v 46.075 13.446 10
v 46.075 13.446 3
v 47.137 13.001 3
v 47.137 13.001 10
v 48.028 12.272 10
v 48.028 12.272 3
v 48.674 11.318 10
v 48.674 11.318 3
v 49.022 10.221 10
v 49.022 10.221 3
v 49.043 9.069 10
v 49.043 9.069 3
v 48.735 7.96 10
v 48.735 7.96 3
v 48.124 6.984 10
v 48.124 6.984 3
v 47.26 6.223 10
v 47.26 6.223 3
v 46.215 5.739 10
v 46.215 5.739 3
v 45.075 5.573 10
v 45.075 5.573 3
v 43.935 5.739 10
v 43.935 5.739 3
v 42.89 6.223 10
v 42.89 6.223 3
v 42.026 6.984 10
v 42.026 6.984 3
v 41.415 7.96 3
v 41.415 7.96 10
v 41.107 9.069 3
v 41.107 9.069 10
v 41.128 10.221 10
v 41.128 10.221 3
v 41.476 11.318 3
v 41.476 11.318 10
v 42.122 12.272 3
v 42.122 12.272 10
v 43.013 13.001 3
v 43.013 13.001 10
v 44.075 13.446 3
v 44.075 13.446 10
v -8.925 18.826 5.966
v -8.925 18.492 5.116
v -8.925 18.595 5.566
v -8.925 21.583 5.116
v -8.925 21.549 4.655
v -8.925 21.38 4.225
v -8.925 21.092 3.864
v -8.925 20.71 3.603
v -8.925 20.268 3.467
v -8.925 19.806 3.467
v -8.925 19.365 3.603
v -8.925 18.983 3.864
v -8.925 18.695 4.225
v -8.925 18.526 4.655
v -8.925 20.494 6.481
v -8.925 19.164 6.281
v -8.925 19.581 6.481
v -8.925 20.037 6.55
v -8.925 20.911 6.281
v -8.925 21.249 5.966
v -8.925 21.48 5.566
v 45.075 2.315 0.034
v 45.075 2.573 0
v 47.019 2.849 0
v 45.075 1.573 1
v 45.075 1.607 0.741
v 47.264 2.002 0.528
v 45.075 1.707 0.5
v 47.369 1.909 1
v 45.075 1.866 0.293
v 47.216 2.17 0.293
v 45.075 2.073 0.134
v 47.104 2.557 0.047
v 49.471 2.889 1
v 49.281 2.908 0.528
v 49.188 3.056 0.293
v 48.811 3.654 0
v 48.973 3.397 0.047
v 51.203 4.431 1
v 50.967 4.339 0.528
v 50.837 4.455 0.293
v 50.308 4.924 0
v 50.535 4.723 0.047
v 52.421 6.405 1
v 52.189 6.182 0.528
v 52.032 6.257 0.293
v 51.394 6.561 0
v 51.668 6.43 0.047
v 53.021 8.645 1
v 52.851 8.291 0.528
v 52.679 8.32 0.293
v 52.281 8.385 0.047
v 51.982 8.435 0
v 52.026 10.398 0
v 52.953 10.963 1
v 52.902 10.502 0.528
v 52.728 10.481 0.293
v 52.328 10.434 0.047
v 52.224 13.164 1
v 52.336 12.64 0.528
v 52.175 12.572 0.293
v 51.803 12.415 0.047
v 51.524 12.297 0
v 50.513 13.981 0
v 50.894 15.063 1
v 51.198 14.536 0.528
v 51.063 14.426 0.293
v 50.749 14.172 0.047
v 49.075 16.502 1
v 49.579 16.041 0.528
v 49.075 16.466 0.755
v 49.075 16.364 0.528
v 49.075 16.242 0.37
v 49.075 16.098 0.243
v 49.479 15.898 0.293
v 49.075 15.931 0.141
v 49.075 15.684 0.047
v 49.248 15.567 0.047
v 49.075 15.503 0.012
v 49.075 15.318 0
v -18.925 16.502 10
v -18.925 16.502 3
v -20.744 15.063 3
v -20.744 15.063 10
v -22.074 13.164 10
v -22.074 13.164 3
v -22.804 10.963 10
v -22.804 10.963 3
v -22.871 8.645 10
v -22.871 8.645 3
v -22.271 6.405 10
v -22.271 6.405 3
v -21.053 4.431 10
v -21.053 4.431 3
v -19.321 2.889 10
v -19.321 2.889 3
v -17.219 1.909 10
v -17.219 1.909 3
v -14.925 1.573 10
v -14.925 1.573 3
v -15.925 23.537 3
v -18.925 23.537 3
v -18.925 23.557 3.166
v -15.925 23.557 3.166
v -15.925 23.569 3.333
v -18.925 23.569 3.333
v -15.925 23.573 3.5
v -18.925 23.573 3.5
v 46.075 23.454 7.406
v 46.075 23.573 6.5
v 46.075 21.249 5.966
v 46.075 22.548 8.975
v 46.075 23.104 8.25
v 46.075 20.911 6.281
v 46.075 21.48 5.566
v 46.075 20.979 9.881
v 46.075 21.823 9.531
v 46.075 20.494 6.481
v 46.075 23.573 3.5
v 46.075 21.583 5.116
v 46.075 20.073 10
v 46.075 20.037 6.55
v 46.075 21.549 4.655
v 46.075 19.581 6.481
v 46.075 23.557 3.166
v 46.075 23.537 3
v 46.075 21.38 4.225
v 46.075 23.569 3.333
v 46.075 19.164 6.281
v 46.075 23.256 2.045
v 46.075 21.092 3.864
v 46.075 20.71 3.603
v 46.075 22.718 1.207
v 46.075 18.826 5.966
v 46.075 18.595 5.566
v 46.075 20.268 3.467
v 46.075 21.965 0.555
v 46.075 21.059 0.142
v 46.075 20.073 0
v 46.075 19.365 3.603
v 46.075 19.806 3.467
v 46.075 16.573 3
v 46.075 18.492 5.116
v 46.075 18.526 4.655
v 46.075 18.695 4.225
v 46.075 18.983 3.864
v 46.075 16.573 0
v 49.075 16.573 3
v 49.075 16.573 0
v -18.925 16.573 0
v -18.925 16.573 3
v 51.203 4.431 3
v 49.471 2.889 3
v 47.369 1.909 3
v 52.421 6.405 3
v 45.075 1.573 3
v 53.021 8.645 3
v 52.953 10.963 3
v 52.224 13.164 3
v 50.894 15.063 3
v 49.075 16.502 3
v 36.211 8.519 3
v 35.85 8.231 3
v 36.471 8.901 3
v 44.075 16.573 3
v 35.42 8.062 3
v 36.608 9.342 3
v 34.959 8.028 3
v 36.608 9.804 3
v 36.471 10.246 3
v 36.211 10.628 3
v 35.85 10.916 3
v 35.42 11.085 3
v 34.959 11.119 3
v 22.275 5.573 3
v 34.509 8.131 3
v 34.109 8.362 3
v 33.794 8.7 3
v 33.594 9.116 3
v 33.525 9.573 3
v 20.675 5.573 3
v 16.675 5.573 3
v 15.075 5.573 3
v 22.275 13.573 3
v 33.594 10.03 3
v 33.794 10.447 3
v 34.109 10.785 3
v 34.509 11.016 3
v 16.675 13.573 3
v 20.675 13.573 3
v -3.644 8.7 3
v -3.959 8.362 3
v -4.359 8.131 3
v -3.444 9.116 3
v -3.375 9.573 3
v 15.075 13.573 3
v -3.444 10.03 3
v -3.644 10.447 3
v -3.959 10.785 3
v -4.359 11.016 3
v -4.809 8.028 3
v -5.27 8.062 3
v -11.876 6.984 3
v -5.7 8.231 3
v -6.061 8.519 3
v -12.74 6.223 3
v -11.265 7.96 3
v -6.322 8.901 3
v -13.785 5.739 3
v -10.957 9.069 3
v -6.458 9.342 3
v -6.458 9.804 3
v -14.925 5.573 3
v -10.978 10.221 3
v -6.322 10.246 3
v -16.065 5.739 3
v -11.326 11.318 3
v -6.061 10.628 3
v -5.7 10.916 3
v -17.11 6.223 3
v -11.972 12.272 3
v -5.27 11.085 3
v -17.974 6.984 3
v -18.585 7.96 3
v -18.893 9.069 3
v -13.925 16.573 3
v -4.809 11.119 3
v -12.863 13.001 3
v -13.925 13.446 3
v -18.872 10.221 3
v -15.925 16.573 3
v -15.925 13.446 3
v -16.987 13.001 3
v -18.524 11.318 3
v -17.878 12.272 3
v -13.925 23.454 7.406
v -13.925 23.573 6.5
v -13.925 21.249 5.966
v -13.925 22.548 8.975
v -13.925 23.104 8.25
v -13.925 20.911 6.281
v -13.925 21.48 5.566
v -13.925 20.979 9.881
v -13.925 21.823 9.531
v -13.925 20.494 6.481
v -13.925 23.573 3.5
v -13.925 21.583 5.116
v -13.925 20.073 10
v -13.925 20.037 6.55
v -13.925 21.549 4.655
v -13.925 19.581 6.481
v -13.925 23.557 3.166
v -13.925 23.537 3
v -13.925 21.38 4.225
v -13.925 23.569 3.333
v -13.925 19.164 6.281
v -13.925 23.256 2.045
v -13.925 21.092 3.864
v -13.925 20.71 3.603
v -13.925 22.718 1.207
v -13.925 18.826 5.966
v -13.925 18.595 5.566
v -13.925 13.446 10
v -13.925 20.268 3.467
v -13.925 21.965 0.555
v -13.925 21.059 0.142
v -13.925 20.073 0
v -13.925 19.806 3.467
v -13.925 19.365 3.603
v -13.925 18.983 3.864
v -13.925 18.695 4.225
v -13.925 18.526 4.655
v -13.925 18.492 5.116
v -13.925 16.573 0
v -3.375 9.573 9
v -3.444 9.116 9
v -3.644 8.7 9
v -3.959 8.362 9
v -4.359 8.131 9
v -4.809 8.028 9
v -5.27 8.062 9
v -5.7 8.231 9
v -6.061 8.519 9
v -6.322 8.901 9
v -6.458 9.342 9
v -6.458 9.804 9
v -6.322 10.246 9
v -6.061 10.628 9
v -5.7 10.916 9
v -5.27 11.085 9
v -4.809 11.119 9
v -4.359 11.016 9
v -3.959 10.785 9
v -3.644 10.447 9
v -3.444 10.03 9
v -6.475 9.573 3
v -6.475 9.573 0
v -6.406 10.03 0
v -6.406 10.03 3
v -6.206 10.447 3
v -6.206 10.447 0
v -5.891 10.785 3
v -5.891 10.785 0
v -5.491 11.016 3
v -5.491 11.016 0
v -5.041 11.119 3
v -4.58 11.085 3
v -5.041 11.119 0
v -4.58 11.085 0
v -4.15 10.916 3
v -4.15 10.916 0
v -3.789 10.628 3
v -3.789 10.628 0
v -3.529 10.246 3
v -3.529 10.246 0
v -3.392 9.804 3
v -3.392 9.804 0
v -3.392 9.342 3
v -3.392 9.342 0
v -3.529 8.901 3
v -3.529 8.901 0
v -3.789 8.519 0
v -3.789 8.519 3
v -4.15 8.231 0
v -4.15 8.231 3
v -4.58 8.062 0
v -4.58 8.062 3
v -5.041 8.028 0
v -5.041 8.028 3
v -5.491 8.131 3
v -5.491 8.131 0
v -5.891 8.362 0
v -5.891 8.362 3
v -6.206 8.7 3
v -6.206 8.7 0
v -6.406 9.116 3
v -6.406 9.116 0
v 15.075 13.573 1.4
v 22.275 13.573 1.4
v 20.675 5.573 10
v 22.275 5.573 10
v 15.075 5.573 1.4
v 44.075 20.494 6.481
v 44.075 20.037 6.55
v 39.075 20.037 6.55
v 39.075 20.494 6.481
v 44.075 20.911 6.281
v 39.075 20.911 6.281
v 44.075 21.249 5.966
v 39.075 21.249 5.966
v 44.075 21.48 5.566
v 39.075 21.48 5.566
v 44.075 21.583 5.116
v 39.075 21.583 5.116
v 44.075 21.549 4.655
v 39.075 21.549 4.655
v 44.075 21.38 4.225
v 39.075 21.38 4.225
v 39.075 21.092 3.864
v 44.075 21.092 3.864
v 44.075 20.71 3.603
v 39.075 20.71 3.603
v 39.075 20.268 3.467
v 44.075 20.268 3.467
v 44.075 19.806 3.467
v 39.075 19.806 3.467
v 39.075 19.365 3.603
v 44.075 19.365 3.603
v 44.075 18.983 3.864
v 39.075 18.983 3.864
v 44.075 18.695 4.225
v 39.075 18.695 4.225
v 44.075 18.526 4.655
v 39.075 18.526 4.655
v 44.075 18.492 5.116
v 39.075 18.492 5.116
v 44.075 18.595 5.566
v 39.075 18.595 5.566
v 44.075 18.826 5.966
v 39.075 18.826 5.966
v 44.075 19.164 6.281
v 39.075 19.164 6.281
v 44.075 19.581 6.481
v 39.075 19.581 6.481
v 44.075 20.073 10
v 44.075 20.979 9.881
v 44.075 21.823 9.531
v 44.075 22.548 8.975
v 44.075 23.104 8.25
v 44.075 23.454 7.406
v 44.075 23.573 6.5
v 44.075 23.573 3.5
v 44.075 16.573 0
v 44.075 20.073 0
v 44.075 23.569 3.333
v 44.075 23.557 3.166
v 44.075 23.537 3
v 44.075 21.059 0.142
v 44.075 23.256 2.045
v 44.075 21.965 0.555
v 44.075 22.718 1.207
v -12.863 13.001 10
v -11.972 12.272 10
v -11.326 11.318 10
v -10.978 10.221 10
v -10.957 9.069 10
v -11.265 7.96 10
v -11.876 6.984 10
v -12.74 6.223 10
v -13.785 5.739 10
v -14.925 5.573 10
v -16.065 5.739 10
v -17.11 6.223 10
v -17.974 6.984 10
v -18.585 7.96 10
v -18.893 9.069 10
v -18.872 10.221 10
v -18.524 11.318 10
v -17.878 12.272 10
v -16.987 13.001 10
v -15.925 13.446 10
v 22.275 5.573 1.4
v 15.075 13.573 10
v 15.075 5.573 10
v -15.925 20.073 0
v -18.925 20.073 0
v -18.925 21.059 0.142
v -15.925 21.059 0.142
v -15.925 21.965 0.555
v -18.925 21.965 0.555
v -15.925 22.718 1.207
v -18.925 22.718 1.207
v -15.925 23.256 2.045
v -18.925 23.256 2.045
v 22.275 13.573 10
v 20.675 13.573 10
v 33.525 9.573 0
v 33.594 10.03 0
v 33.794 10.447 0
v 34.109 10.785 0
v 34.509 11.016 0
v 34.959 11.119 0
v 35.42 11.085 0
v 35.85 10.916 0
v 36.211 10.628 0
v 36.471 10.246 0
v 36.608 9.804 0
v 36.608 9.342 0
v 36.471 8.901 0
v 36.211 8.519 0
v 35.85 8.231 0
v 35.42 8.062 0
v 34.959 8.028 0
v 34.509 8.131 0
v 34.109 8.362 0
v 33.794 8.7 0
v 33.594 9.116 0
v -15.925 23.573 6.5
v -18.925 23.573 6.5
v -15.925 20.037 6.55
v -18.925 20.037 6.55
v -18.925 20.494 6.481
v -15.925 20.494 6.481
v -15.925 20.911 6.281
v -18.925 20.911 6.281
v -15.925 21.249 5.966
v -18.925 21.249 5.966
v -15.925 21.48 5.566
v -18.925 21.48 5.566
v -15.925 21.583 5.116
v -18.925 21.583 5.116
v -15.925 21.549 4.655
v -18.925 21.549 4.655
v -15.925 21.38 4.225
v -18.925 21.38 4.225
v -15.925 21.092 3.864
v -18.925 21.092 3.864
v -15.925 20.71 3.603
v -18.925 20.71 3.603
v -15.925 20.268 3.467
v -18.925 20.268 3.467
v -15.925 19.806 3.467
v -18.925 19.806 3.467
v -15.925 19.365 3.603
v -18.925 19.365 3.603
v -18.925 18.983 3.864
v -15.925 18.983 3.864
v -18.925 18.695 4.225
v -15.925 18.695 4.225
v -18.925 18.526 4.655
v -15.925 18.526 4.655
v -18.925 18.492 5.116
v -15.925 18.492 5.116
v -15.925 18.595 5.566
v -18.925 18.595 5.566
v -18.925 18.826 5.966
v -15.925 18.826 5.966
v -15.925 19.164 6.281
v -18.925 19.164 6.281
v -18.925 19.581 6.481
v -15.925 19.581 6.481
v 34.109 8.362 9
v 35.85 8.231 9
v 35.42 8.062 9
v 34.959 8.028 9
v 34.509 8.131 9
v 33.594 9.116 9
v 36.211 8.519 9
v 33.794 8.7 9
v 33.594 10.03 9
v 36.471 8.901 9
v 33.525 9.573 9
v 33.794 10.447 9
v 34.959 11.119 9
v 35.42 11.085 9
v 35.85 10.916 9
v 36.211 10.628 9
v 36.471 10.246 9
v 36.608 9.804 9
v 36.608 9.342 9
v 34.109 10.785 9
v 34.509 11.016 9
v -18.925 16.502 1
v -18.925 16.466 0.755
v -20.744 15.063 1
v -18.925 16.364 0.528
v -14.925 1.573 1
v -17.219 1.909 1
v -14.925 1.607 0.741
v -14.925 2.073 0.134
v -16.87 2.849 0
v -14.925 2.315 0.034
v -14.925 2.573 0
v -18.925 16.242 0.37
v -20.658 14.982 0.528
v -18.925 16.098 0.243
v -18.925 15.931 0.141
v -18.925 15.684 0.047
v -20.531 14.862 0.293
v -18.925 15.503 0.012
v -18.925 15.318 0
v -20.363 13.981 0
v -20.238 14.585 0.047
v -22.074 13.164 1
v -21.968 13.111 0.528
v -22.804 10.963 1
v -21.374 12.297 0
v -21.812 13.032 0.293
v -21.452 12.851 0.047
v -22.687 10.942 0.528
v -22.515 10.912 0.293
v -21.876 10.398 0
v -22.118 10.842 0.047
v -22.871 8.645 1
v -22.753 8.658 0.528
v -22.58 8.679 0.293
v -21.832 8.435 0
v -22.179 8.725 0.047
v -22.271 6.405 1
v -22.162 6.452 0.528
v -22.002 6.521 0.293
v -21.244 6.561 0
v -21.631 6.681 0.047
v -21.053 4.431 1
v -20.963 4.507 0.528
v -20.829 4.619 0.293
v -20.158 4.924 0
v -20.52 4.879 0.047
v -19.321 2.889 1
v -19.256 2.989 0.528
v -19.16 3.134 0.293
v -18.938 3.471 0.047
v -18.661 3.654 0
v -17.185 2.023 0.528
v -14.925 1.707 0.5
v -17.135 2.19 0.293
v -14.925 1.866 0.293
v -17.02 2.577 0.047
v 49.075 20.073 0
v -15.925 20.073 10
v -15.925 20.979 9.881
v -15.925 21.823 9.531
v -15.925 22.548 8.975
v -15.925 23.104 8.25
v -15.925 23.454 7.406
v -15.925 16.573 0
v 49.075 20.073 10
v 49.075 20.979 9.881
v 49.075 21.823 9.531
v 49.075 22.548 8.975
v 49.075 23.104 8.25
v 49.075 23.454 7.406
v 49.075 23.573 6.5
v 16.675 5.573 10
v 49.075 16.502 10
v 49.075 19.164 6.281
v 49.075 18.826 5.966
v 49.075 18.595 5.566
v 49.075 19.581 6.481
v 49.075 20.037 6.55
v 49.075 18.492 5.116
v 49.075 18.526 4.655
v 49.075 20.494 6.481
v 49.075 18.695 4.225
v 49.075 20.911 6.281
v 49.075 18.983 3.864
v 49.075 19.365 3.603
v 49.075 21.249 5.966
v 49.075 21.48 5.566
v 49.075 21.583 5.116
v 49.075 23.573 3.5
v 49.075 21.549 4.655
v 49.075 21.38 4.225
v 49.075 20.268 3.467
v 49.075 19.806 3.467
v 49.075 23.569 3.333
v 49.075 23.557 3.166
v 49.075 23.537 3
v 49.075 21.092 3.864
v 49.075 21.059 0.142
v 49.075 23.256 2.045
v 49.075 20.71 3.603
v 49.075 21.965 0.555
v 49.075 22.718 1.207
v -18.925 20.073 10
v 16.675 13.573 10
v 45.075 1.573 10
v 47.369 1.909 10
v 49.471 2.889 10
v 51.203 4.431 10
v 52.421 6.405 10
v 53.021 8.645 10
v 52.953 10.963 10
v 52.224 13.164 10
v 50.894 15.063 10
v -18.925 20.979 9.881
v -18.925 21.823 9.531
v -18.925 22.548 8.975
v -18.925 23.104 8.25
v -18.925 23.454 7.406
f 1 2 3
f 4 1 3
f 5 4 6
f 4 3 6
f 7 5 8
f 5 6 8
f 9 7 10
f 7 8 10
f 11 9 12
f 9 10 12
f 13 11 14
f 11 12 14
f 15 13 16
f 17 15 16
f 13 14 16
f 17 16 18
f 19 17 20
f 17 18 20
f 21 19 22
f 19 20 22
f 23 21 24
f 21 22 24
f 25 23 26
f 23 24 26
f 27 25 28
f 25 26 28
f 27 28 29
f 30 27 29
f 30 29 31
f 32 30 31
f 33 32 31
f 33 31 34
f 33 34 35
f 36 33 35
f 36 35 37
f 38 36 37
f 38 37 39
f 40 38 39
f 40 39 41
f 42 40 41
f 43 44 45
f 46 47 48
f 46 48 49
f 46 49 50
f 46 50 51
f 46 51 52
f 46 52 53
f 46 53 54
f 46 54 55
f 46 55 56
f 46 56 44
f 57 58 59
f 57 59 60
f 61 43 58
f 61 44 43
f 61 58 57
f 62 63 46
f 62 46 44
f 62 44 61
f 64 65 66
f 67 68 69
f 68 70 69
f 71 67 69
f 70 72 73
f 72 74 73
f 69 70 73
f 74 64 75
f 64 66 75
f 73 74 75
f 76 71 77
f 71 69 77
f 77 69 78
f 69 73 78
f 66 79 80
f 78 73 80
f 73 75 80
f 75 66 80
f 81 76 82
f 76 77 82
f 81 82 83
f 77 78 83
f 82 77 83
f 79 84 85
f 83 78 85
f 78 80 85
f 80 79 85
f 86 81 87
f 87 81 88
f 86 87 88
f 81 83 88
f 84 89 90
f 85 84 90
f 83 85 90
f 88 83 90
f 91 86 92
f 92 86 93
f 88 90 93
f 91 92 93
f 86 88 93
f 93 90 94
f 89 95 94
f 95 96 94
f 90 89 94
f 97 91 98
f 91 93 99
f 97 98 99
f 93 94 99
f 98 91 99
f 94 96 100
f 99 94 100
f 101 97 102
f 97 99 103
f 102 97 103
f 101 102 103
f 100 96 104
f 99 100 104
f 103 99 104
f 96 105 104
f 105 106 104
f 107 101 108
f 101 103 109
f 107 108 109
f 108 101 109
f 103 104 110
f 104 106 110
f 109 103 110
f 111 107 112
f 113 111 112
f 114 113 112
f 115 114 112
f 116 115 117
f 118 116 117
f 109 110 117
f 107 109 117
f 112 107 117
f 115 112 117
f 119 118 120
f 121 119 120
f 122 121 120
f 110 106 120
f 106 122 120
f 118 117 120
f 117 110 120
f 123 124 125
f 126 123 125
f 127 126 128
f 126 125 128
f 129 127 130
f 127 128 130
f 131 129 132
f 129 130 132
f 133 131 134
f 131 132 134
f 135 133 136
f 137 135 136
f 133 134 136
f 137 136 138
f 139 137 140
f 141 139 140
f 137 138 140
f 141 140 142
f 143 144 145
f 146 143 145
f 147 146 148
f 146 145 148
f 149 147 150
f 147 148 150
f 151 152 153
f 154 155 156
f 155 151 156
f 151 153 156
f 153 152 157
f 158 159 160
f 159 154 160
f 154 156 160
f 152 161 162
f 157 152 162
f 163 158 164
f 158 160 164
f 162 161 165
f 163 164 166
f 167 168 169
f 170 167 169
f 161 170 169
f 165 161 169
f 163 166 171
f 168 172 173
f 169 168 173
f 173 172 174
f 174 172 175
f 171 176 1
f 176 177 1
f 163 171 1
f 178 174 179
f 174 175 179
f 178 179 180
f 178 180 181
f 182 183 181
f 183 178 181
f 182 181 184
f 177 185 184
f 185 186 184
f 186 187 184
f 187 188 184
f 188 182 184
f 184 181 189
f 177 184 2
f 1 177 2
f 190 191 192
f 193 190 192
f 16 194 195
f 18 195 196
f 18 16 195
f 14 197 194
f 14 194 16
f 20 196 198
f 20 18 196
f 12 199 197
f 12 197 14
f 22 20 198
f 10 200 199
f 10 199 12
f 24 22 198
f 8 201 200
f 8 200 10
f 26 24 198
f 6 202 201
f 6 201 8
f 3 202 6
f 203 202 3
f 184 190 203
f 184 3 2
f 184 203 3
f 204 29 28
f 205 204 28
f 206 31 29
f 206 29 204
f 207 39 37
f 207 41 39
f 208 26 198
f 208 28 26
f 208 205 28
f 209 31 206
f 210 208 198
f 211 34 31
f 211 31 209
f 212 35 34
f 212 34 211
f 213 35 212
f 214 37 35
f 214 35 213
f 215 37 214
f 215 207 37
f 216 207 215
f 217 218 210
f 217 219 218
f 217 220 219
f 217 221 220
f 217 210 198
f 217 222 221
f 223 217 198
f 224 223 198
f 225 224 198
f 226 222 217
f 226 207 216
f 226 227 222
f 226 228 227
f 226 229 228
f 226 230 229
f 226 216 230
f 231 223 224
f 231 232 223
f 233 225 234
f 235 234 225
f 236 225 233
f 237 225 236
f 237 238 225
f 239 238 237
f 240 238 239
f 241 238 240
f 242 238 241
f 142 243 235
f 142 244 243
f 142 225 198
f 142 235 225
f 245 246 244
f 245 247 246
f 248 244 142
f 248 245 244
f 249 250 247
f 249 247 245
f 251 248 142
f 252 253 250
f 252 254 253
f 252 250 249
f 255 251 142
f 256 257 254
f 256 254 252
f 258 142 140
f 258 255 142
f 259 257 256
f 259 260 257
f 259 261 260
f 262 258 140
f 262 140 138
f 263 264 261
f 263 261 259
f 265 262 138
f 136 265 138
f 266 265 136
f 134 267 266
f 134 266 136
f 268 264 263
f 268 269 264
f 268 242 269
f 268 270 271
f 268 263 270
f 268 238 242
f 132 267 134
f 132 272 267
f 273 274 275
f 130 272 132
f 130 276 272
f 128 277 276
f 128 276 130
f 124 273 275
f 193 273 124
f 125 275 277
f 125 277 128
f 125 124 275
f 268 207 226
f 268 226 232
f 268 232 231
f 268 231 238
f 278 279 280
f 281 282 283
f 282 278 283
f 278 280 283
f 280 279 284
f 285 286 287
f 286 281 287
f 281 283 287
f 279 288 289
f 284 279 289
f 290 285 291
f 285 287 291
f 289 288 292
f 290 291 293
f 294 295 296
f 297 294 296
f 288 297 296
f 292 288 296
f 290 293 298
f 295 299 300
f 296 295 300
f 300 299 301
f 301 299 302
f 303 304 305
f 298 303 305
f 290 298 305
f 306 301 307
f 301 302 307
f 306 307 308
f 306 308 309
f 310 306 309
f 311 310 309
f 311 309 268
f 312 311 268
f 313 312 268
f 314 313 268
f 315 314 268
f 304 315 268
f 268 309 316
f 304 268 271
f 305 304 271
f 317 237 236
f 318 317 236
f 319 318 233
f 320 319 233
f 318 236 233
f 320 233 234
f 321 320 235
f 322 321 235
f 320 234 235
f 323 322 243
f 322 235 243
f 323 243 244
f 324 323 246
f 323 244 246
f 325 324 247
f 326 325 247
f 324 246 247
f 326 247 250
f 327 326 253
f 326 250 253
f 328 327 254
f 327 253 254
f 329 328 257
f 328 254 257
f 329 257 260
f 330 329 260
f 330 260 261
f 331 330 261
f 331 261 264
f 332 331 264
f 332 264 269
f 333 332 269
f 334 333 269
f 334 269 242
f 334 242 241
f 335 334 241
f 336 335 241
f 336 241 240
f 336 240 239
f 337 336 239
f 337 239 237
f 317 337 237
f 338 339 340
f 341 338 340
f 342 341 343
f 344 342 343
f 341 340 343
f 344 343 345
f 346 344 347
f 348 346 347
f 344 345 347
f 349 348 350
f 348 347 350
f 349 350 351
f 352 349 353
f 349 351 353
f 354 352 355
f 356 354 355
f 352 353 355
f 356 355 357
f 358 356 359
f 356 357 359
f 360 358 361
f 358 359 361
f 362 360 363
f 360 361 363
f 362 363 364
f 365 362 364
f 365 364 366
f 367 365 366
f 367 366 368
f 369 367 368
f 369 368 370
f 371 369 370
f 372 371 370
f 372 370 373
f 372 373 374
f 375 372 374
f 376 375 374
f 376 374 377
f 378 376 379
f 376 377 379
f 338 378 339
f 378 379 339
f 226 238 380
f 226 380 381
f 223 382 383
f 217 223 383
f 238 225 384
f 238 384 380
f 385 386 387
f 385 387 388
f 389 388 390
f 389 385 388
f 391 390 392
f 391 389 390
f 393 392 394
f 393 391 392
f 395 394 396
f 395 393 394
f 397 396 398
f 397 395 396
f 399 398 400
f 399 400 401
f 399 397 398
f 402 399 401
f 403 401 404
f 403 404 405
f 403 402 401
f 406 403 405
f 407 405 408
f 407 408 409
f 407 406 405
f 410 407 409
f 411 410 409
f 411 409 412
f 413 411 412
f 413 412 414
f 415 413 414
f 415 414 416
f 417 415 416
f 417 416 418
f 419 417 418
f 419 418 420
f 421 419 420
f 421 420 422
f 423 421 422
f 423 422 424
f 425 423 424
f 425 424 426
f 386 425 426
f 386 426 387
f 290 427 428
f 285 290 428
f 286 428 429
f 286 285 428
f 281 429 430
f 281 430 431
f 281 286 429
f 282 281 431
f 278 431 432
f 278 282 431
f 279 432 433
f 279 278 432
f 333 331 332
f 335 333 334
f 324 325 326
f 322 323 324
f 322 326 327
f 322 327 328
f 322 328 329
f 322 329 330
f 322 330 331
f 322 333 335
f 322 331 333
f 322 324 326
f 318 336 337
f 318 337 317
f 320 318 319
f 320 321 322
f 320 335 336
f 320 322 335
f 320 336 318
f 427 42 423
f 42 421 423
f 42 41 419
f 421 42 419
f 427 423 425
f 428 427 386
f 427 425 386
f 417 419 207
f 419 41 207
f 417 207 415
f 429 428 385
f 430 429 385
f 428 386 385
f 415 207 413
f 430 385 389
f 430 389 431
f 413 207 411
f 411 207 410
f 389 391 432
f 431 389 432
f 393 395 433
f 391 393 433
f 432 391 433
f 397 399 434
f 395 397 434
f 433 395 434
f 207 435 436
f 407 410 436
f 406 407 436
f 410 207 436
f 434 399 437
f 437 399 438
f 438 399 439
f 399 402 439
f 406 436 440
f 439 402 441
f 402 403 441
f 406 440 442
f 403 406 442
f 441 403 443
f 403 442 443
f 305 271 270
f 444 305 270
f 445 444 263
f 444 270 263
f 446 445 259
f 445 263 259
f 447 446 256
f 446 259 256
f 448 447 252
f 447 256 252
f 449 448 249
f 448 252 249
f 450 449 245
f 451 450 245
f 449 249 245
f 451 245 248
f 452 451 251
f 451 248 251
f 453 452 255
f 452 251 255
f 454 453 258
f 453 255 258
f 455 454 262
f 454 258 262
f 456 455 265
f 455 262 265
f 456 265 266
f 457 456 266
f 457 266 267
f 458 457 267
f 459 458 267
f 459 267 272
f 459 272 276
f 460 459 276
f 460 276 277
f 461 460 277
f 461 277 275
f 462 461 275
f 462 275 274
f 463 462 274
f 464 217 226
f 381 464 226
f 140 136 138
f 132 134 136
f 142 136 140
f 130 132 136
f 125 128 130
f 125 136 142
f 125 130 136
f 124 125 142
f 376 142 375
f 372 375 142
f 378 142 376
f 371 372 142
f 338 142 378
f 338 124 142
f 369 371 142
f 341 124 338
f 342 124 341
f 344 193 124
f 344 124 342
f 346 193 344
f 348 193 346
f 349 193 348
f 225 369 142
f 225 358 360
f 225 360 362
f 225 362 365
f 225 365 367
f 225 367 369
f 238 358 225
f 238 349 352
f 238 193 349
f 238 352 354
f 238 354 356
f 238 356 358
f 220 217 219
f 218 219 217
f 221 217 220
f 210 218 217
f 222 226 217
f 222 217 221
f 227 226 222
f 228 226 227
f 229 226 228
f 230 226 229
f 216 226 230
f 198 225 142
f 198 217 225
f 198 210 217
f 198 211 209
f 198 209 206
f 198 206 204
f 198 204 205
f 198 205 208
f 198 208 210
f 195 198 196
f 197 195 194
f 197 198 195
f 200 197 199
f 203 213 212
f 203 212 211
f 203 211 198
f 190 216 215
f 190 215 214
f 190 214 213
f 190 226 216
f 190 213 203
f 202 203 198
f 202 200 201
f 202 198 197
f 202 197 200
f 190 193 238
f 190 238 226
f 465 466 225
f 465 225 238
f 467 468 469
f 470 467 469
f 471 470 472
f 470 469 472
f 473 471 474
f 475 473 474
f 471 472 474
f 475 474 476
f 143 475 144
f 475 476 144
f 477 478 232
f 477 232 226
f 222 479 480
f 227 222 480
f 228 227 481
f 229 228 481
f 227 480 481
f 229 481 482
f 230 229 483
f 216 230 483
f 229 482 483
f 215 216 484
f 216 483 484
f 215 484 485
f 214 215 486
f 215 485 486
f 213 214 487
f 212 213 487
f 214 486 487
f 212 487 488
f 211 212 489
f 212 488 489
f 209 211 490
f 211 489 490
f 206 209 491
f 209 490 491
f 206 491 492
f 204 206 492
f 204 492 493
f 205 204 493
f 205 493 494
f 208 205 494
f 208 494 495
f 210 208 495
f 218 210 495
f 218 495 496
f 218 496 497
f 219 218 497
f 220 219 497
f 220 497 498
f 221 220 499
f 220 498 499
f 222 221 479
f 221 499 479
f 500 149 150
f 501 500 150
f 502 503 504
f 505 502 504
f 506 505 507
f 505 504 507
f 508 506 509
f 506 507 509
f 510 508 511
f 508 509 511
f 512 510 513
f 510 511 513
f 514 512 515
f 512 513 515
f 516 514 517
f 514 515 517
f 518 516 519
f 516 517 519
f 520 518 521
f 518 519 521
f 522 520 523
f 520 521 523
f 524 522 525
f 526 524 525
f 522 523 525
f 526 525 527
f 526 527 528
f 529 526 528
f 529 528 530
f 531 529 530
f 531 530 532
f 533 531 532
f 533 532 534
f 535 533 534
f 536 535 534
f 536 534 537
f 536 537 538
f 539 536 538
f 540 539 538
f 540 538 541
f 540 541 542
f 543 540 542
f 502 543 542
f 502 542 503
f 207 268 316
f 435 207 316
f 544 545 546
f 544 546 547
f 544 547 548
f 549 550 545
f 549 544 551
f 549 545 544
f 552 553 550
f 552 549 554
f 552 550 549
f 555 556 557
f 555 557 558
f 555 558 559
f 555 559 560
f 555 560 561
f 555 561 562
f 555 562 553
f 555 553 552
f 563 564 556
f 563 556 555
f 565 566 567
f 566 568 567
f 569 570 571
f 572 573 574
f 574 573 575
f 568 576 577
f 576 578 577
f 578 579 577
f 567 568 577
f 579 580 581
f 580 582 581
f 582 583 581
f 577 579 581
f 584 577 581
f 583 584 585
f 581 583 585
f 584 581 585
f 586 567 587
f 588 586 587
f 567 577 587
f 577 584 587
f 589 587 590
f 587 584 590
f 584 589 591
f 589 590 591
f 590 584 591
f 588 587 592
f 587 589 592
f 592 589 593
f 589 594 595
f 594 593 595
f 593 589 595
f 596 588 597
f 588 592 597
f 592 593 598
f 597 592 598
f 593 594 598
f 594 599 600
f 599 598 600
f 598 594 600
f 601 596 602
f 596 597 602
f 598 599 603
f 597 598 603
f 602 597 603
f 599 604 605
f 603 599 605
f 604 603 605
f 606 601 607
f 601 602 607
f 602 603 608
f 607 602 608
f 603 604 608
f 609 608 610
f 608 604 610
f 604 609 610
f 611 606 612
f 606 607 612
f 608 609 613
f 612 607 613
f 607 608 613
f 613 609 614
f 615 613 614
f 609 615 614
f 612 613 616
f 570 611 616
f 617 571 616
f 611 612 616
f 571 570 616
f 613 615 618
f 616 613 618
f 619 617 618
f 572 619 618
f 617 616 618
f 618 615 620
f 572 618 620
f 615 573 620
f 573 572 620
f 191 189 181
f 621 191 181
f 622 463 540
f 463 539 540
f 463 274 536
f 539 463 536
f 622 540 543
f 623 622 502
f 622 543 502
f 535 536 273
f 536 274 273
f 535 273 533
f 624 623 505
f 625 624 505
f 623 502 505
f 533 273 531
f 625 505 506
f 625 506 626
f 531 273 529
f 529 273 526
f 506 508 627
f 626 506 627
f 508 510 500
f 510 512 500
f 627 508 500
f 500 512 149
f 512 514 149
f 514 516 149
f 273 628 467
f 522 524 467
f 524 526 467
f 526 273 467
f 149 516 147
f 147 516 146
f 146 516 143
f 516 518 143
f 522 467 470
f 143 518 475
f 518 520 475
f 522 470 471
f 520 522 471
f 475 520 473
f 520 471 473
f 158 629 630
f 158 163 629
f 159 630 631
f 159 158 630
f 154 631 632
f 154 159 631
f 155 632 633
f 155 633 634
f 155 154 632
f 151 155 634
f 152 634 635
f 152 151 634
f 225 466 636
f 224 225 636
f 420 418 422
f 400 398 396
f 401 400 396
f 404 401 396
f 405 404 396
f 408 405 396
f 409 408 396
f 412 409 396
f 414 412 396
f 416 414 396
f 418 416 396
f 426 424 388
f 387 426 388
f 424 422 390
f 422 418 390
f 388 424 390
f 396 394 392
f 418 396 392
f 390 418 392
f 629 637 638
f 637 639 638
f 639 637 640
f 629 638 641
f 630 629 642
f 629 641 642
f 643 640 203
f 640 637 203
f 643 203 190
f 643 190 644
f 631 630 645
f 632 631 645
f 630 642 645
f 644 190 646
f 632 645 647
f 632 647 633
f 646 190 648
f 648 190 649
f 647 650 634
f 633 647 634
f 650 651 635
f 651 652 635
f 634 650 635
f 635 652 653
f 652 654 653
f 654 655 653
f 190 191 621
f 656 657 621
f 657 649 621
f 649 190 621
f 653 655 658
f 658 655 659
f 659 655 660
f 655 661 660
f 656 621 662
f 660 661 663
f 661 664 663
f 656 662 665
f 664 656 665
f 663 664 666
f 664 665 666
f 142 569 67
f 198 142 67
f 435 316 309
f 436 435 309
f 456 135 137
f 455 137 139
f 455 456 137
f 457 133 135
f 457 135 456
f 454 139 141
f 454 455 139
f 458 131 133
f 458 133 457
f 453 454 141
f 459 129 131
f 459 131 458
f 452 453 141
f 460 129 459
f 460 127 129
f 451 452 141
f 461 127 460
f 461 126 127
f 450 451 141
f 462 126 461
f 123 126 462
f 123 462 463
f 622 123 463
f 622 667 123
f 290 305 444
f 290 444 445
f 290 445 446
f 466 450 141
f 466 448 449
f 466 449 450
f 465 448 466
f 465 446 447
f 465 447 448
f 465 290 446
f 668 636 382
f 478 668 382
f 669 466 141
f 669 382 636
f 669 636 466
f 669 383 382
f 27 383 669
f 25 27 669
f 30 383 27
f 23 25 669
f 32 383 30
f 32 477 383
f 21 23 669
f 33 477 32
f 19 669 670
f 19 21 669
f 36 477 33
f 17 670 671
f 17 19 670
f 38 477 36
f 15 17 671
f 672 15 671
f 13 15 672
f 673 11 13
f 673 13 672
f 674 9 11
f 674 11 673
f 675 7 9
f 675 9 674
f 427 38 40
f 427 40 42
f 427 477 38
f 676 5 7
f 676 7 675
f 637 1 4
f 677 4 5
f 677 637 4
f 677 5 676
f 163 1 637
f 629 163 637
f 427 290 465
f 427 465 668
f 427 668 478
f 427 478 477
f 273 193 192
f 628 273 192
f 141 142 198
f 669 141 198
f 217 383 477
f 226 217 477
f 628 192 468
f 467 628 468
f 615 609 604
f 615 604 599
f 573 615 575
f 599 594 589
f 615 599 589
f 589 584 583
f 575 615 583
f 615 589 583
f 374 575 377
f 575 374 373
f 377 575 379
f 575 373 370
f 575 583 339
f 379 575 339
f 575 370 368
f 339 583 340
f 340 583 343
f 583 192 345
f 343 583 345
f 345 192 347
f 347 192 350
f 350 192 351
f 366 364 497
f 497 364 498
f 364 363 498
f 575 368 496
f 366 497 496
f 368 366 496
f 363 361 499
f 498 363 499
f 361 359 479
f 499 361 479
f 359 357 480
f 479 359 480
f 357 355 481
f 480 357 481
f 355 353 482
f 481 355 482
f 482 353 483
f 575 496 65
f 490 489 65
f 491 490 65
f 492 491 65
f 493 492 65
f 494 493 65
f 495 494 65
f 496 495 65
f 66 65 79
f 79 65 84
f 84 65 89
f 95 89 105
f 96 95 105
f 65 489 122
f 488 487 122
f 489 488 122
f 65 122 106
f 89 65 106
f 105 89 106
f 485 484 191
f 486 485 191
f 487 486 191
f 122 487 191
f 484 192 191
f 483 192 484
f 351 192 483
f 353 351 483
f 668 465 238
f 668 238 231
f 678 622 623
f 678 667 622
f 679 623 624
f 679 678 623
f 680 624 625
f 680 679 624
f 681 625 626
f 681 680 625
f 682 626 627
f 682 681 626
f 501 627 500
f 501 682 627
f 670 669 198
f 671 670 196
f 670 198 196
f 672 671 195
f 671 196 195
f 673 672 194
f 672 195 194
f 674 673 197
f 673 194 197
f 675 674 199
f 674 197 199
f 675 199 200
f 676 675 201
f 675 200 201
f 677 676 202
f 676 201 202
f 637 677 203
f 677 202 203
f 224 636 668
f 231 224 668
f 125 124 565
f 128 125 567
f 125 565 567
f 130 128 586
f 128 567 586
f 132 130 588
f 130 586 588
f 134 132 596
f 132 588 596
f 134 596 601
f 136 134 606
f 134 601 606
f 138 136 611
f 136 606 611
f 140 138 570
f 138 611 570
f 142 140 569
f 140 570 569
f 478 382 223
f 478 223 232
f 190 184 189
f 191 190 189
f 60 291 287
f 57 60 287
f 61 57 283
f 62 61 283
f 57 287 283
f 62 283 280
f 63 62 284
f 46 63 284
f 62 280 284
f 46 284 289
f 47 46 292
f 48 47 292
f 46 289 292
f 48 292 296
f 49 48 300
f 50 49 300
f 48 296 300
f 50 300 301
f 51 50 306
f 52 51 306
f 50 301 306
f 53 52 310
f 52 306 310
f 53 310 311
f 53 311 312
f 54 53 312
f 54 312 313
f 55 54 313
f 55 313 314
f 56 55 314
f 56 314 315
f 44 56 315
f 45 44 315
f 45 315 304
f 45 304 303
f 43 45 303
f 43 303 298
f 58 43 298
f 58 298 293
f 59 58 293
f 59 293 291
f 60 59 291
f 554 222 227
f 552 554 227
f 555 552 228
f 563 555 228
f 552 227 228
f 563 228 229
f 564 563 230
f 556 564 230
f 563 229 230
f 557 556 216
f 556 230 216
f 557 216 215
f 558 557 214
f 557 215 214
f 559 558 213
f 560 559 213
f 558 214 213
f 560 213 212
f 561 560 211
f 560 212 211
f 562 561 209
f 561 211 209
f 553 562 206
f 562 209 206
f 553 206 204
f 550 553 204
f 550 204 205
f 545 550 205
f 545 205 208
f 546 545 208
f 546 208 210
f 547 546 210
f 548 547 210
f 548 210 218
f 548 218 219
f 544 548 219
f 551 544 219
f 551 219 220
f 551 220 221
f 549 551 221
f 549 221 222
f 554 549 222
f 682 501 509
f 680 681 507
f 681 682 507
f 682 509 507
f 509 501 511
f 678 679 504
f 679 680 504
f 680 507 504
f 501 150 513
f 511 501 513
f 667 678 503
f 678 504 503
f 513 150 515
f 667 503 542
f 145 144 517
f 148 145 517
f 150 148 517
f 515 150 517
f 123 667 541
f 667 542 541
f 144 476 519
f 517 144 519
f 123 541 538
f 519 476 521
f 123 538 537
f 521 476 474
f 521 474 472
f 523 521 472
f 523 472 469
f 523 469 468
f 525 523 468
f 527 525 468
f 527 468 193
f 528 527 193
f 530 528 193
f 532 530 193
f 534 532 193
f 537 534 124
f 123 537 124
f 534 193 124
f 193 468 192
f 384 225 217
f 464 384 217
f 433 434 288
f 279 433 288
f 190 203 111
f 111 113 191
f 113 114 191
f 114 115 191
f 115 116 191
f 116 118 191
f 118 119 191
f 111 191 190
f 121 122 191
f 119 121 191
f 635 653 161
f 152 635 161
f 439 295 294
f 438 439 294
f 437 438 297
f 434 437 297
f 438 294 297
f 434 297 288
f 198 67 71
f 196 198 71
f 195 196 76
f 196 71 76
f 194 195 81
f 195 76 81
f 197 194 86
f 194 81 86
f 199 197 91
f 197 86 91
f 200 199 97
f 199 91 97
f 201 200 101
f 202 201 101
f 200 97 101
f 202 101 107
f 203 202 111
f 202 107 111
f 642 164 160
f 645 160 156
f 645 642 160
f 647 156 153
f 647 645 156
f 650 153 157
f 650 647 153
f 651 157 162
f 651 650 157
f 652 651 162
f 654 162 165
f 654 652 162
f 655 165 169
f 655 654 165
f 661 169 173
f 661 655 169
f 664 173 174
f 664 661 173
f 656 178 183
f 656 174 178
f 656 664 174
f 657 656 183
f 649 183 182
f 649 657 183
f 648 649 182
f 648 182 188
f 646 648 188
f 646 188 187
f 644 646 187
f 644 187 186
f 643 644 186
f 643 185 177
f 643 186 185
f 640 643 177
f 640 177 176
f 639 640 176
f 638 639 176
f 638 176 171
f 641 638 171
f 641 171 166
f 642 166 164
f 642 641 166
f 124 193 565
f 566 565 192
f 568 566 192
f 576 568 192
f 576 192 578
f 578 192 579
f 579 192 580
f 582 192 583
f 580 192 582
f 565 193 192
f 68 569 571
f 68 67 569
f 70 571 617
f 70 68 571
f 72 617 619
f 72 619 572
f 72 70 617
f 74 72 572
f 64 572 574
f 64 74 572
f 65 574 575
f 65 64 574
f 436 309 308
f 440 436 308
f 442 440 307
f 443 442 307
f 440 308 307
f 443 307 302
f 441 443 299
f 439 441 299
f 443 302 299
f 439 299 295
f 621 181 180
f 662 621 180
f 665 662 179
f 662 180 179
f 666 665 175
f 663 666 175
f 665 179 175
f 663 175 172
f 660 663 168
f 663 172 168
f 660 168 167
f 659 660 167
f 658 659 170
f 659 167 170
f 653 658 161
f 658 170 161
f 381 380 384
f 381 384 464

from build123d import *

# Parameters (mm, degrees)
BOSS_EXTRUDE1_DEPTH = 10
SKETCH2_R           = 1.55
CUT_EXTRUDE1_DEPTH  = 10
FILLET1_R           = 3.5
BOSS_EXTRUDE2_DEPTH = 3
SKETCH4_R           = 1.55
CUT_EXTRUDE2_DEPTH  = 9
SPLIT2_START        = 16.573368434
SPLIT2_OUTLINE_W    = 3
SPLIT2_OUTLINE_H    = 3
SPLIT2_OUTLINE_W_2  = 58
SPLIT2_DEPTH        = 8.426631566
SPLIT2_START_2      = -18.925043944
SPLIT2_2_DEPTH      = 3
SPLIT2_START_3      = -13.925043944
SPLIT2_3_DEPTH      = 58
SPLIT2_START_4      = 46.074956056
SPLIT2_4_DEPTH      = 3
SKETCH5_R           = 1.55
BOSS_EXTRUDE3_DEPTH = 3
SKETCH6_W           = 1.6
SKETCH6_H           = 8
CUT_EXTRUDE3_DEPTH  = 7
SKETCH7_W           = 7.2
SKETCH7_H           = 8
CUT_EXTRUDE4_DEPTH  = 1.6
FILLET2_R           = 1


with BuildPart() as part:
    # Sketch1 → Boss-Extrude1 (new body)
    with BuildSketch(Plane.XY):
        with BuildLine():
            Line((-14.925043944, 1.573368434), (45.074956056, 1.573368434))
            ThreePointArc((45.074956056, 1.573368434), (52.802362666, 7.502816073), (49.074956056, 16.501571665))
            Line((49.074956056, 16.501571665), (49.074956056, 23.573368434))
            Line((49.074956056, 23.573368434), (46.074956056, 23.573368434))
            Line((46.074956056, 23.573368434), (46.074956056, 13.44635178))
            ThreePointArc((46.074956056, 13.44635178), (45.074956056, 5.573368434), (44.074956056, 13.44635178))
            Line((44.074956056, 13.44635178), (44.074956056, 23.573368434))
            Line((44.074956056, 23.573368434), (-13.925043944, 23.573368434))
            Line((-13.925043944, 23.573368434), (-13.925043944, 13.44635178))
            ThreePointArc((-13.925043944, 13.44635178), (-14.925043944, 5.573368434), (-15.925043944, 13.44635178))
            Line((-15.925043944, 13.44635178), (-15.925043944, 23.573368434))
            Line((-15.925043944, 23.573368434), (-18.925043944, 23.573368434))
            Line((-18.925043944, 23.573368434), (-18.925043944, 16.501571665))
            ThreePointArc((-18.925043944, 16.501571665), (-22.652450555, 7.502816073), (-14.925043944, 1.573368434))
        make_face()
    extrude(amount=BOSS_EXTRUDE1_DEPTH)

    # Sketch2 → Cut-Extrude1 (cut)
    with BuildSketch(Plane.ZY.offset(18.925043944)):
        with Locations((5, 20.037470049)):
            Circle(SKETCH2_R)
    cut_extrude1 = extrude(amount=-CUT_EXTRUDE1_DEPTH, mode=Mode.SUBTRACT)

    # Fillet1
    fillet1_edges = [part.edges().sort_by_distance(p)[0] for p in [
        (-17.425043944, 23.573368434, 0),
        (15.074956056, 23.573368434, 0),
        (47.574956056, 23.573368434, 0),
        (47.574956056, 23.573368434, 10),
        (15.074956056, 23.573368434, 10),
        (-17.425043944, 23.573368434, 10),
    ]]
    fillet(fillet1_edges, radius=FILLET1_R)

    # Mirror1: Cut-Extrude1 across plane
    add(cut_extrude1.mirror(Plane.ZY.offset(-15.074956056)), mode=Mode.SUBTRACT)

    # Sketch4 → Cut-Extrude2 (cut)
    with BuildSketch(Plane(origin=(0, 0, 0), x_dir=(-1, 0, 0), z_dir=(0, 0, -1))):
        with Locations((-35.074956056, 9.573368434)):
            Circle(SKETCH4_R)
        with Locations(Location((4.925043944, 9.573368434, 0), (0, 0, 180))):
            Circle(SKETCH4_R)
    extrude(amount=-CUT_EXTRUDE2_DEPTH, mode=Mode.SUBTRACT)


with BuildPart() as body_2:
    # Sketch3 → Boss-Extrude2 (new body)
    with BuildSketch(Plane(origin=(0, 0, 0), x_dir=(-1, 0, 0), z_dir=(0, 0, -1))):
        with BuildLine():
            Line((-45.074956056, 17.573368434), (14.925043944, 17.573368434))
            ThreePointArc((14.925043944, 17.573368434), (22.925043944, 9.573368434), (14.925043944, 1.573368434))
            Line((14.925043944, 1.573368434), (-45.074956056, 1.573368434))
            ThreePointArc((-45.074956056, 1.573368434), (-53.074956056, 9.573368434), (-45.074956056, 17.573368434))
        make_face()
    extrude(amount=BOSS_EXTRUDE2_DEPTH)


with BuildPart() as body_3:
    # Split1: the piece on the far side of the plane
    add(part.part)
    split(bisect_by=Plane(origin=(0, 0, 3), x_dir=(-1, 0, 0), z_dir=(0, 0, -1)), keep=Keep.BOTTOM)


with BuildPart() as part_1:
    add(part.part)

    # Split1
    split(bisect_by=Plane(origin=(0, 0, 3), x_dir=(-1, 0, 0), z_dir=(0, 0, -1)), keep=Keep.TOP)

    # Split2: read off the stored shape, not the designer's step
    # Split2 outline → Split2 (cut)
    with BuildSketch(Plane(origin=(0, 0, 0), x_dir=(1, 0, 0), z_dir=(0, 1, 0)).offset(SPLIT2_START)):
        with Locations((47.574956056, -1.5)):
            Rectangle(SPLIT2_OUTLINE_W, SPLIT2_OUTLINE_H)
        with Locations((15.074956056, -1.5)):
            Rectangle(SPLIT2_OUTLINE_W_2, SPLIT2_OUTLINE_H)
        with Locations((-17.425043944, -1.5)):
            Rectangle(SPLIT2_OUTLINE_W, SPLIT2_OUTLINE_H)
    extrude(amount=SPLIT2_DEPTH, mode=Mode.SUBTRACT)


with BuildPart() as body_4:
    # Split2 2 outline → Split2 2 (new body)
    with BuildSketch(Plane.YZ.offset(SPLIT2_START_2)):
        with BuildLine():
            Line((16.573368434, 3), (16.573368434, 0))
            Line((16.573368434, 0), (20.073368434, 0))
            ThreePointArc((20.073368434, 0), (22.364656282, 0.854248689), (23.537470049, 3))
            Line((23.537470049, 3), (16.573368434, 3))
        make_face()
    extrude(amount=SPLIT2_2_DEPTH)


with BuildPart() as body_5:
    # Split2 3 outline → Split2 3 (new body)
    with BuildSketch(Plane.YZ.offset(SPLIT2_START_3)):
        with BuildLine():
            Line((16.573368434, 3), (16.573368434, 0))
            Line((16.573368434, 0), (20.073368434, 0))
            ThreePointArc((20.073368434, 0), (22.364656282, 0.854248689), (23.537470049, 3))
            Line((23.537470049, 3), (16.573368434, 3))
        make_face()
    extrude(amount=SPLIT2_3_DEPTH)


with BuildPart() as body_6:
    # Split2 4 outline → Split2 4 (new body)
    with BuildSketch(Plane.YZ.offset(SPLIT2_START_4)):
        with BuildLine():
            Line((16.573368434, 3), (16.573368434, 0))
            Line((16.573368434, 0), (20.073368434, 0))
            ThreePointArc((20.073368434, 0), (22.364656282, 0.854248689), (23.537470049, 3))
            Line((23.537470049, 3), (16.573368434, 3))
        make_face()
    extrude(amount=SPLIT2_4_DEPTH)

    # Combine1: union body 5, body 4, body 3
    add(body_5.part)
    add(body_4.part)
    add(body_3.part)

    # Sketch6 → Cut-Extrude3 (cut)
    with BuildSketch(Plane.XY.offset(10)):
        with Locations((15.874956056, 9.573368434)):
            Rectangle(SKETCH6_W, SKETCH6_H)
        with Locations((21.474956056, 9.573368434)):
            Rectangle(SKETCH6_W, SKETCH6_H)
    extrude(amount=-CUT_EXTRUDE3_DEPTH, mode=Mode.SUBTRACT)


with BuildPart() as body_4_2:
    # Sketch5 → Boss-Extrude3 (new body)
    with BuildSketch(Plane(origin=(0, 0, 0), x_dir=(-1, 0, 0), z_dir=(0, 0, -1))):
        with BuildLine():
            Line((-46.074956056, 16.573368434), (-44.074956056, 16.573368434))
            Line((-44.074956056, 16.573368434), (13.925043944, 16.573368434))
            Line((13.925043944, 16.573368434), (15.925043944, 16.573368434))
            Line((15.925043944, 16.573368434), (18.925043944, 16.573368434))
            Line((18.925043944, 16.573368434), (18.925043944, 16.501571665))
            ThreePointArc((18.925043944, 16.501571665), (22.652450555, 7.502816073), (14.925043944, 1.573368434))
            Line((14.925043944, 1.573368434), (-45.074956056, 1.573368434))
            ThreePointArc((-45.074956056, 1.573368434), (-52.802362666, 7.502816073), (-49.074956056, 16.501571665))
            Line((-49.074956056, 16.501571665), (-49.074956056, 16.573368434))
            Line((-49.074956056, 16.573368434), (-46.074956056, 16.573368434))
        make_face()
        with Locations((4.925043944, 9.573368434)):
            Circle(SKETCH5_R, mode=Mode.SUBTRACT)
        with Locations((-35.074956056, 9.573368434)):
            Circle(SKETCH5_R, mode=Mode.SUBTRACT)
    extrude(amount=-BOSS_EXTRUDE3_DEPTH)

    # Sketch7 → Cut-Extrude4 (cut)
    with BuildSketch(Plane.XY.offset(3)):
        with Locations((18.674956056, 9.573368434)):
            Rectangle(SKETCH7_W, SKETCH7_H)
    extrude(amount=-CUT_EXTRUDE4_DEPTH, mode=Mode.SUBTRACT)

    # Fillet2
    fillet2_edges = [body_4_2.edges().sort_by_distance(p)[0] for p in [
        (-22.652450555, 7.502816073, 0),
        (15.074956056, 1.573368434, 0),
        (52.802362666, 7.502816073, 0),
    ]]
    fillet(fillet2_edges, radius=FILLET2_R)


solid = Compound([body_6.part, body_4_2.part])
